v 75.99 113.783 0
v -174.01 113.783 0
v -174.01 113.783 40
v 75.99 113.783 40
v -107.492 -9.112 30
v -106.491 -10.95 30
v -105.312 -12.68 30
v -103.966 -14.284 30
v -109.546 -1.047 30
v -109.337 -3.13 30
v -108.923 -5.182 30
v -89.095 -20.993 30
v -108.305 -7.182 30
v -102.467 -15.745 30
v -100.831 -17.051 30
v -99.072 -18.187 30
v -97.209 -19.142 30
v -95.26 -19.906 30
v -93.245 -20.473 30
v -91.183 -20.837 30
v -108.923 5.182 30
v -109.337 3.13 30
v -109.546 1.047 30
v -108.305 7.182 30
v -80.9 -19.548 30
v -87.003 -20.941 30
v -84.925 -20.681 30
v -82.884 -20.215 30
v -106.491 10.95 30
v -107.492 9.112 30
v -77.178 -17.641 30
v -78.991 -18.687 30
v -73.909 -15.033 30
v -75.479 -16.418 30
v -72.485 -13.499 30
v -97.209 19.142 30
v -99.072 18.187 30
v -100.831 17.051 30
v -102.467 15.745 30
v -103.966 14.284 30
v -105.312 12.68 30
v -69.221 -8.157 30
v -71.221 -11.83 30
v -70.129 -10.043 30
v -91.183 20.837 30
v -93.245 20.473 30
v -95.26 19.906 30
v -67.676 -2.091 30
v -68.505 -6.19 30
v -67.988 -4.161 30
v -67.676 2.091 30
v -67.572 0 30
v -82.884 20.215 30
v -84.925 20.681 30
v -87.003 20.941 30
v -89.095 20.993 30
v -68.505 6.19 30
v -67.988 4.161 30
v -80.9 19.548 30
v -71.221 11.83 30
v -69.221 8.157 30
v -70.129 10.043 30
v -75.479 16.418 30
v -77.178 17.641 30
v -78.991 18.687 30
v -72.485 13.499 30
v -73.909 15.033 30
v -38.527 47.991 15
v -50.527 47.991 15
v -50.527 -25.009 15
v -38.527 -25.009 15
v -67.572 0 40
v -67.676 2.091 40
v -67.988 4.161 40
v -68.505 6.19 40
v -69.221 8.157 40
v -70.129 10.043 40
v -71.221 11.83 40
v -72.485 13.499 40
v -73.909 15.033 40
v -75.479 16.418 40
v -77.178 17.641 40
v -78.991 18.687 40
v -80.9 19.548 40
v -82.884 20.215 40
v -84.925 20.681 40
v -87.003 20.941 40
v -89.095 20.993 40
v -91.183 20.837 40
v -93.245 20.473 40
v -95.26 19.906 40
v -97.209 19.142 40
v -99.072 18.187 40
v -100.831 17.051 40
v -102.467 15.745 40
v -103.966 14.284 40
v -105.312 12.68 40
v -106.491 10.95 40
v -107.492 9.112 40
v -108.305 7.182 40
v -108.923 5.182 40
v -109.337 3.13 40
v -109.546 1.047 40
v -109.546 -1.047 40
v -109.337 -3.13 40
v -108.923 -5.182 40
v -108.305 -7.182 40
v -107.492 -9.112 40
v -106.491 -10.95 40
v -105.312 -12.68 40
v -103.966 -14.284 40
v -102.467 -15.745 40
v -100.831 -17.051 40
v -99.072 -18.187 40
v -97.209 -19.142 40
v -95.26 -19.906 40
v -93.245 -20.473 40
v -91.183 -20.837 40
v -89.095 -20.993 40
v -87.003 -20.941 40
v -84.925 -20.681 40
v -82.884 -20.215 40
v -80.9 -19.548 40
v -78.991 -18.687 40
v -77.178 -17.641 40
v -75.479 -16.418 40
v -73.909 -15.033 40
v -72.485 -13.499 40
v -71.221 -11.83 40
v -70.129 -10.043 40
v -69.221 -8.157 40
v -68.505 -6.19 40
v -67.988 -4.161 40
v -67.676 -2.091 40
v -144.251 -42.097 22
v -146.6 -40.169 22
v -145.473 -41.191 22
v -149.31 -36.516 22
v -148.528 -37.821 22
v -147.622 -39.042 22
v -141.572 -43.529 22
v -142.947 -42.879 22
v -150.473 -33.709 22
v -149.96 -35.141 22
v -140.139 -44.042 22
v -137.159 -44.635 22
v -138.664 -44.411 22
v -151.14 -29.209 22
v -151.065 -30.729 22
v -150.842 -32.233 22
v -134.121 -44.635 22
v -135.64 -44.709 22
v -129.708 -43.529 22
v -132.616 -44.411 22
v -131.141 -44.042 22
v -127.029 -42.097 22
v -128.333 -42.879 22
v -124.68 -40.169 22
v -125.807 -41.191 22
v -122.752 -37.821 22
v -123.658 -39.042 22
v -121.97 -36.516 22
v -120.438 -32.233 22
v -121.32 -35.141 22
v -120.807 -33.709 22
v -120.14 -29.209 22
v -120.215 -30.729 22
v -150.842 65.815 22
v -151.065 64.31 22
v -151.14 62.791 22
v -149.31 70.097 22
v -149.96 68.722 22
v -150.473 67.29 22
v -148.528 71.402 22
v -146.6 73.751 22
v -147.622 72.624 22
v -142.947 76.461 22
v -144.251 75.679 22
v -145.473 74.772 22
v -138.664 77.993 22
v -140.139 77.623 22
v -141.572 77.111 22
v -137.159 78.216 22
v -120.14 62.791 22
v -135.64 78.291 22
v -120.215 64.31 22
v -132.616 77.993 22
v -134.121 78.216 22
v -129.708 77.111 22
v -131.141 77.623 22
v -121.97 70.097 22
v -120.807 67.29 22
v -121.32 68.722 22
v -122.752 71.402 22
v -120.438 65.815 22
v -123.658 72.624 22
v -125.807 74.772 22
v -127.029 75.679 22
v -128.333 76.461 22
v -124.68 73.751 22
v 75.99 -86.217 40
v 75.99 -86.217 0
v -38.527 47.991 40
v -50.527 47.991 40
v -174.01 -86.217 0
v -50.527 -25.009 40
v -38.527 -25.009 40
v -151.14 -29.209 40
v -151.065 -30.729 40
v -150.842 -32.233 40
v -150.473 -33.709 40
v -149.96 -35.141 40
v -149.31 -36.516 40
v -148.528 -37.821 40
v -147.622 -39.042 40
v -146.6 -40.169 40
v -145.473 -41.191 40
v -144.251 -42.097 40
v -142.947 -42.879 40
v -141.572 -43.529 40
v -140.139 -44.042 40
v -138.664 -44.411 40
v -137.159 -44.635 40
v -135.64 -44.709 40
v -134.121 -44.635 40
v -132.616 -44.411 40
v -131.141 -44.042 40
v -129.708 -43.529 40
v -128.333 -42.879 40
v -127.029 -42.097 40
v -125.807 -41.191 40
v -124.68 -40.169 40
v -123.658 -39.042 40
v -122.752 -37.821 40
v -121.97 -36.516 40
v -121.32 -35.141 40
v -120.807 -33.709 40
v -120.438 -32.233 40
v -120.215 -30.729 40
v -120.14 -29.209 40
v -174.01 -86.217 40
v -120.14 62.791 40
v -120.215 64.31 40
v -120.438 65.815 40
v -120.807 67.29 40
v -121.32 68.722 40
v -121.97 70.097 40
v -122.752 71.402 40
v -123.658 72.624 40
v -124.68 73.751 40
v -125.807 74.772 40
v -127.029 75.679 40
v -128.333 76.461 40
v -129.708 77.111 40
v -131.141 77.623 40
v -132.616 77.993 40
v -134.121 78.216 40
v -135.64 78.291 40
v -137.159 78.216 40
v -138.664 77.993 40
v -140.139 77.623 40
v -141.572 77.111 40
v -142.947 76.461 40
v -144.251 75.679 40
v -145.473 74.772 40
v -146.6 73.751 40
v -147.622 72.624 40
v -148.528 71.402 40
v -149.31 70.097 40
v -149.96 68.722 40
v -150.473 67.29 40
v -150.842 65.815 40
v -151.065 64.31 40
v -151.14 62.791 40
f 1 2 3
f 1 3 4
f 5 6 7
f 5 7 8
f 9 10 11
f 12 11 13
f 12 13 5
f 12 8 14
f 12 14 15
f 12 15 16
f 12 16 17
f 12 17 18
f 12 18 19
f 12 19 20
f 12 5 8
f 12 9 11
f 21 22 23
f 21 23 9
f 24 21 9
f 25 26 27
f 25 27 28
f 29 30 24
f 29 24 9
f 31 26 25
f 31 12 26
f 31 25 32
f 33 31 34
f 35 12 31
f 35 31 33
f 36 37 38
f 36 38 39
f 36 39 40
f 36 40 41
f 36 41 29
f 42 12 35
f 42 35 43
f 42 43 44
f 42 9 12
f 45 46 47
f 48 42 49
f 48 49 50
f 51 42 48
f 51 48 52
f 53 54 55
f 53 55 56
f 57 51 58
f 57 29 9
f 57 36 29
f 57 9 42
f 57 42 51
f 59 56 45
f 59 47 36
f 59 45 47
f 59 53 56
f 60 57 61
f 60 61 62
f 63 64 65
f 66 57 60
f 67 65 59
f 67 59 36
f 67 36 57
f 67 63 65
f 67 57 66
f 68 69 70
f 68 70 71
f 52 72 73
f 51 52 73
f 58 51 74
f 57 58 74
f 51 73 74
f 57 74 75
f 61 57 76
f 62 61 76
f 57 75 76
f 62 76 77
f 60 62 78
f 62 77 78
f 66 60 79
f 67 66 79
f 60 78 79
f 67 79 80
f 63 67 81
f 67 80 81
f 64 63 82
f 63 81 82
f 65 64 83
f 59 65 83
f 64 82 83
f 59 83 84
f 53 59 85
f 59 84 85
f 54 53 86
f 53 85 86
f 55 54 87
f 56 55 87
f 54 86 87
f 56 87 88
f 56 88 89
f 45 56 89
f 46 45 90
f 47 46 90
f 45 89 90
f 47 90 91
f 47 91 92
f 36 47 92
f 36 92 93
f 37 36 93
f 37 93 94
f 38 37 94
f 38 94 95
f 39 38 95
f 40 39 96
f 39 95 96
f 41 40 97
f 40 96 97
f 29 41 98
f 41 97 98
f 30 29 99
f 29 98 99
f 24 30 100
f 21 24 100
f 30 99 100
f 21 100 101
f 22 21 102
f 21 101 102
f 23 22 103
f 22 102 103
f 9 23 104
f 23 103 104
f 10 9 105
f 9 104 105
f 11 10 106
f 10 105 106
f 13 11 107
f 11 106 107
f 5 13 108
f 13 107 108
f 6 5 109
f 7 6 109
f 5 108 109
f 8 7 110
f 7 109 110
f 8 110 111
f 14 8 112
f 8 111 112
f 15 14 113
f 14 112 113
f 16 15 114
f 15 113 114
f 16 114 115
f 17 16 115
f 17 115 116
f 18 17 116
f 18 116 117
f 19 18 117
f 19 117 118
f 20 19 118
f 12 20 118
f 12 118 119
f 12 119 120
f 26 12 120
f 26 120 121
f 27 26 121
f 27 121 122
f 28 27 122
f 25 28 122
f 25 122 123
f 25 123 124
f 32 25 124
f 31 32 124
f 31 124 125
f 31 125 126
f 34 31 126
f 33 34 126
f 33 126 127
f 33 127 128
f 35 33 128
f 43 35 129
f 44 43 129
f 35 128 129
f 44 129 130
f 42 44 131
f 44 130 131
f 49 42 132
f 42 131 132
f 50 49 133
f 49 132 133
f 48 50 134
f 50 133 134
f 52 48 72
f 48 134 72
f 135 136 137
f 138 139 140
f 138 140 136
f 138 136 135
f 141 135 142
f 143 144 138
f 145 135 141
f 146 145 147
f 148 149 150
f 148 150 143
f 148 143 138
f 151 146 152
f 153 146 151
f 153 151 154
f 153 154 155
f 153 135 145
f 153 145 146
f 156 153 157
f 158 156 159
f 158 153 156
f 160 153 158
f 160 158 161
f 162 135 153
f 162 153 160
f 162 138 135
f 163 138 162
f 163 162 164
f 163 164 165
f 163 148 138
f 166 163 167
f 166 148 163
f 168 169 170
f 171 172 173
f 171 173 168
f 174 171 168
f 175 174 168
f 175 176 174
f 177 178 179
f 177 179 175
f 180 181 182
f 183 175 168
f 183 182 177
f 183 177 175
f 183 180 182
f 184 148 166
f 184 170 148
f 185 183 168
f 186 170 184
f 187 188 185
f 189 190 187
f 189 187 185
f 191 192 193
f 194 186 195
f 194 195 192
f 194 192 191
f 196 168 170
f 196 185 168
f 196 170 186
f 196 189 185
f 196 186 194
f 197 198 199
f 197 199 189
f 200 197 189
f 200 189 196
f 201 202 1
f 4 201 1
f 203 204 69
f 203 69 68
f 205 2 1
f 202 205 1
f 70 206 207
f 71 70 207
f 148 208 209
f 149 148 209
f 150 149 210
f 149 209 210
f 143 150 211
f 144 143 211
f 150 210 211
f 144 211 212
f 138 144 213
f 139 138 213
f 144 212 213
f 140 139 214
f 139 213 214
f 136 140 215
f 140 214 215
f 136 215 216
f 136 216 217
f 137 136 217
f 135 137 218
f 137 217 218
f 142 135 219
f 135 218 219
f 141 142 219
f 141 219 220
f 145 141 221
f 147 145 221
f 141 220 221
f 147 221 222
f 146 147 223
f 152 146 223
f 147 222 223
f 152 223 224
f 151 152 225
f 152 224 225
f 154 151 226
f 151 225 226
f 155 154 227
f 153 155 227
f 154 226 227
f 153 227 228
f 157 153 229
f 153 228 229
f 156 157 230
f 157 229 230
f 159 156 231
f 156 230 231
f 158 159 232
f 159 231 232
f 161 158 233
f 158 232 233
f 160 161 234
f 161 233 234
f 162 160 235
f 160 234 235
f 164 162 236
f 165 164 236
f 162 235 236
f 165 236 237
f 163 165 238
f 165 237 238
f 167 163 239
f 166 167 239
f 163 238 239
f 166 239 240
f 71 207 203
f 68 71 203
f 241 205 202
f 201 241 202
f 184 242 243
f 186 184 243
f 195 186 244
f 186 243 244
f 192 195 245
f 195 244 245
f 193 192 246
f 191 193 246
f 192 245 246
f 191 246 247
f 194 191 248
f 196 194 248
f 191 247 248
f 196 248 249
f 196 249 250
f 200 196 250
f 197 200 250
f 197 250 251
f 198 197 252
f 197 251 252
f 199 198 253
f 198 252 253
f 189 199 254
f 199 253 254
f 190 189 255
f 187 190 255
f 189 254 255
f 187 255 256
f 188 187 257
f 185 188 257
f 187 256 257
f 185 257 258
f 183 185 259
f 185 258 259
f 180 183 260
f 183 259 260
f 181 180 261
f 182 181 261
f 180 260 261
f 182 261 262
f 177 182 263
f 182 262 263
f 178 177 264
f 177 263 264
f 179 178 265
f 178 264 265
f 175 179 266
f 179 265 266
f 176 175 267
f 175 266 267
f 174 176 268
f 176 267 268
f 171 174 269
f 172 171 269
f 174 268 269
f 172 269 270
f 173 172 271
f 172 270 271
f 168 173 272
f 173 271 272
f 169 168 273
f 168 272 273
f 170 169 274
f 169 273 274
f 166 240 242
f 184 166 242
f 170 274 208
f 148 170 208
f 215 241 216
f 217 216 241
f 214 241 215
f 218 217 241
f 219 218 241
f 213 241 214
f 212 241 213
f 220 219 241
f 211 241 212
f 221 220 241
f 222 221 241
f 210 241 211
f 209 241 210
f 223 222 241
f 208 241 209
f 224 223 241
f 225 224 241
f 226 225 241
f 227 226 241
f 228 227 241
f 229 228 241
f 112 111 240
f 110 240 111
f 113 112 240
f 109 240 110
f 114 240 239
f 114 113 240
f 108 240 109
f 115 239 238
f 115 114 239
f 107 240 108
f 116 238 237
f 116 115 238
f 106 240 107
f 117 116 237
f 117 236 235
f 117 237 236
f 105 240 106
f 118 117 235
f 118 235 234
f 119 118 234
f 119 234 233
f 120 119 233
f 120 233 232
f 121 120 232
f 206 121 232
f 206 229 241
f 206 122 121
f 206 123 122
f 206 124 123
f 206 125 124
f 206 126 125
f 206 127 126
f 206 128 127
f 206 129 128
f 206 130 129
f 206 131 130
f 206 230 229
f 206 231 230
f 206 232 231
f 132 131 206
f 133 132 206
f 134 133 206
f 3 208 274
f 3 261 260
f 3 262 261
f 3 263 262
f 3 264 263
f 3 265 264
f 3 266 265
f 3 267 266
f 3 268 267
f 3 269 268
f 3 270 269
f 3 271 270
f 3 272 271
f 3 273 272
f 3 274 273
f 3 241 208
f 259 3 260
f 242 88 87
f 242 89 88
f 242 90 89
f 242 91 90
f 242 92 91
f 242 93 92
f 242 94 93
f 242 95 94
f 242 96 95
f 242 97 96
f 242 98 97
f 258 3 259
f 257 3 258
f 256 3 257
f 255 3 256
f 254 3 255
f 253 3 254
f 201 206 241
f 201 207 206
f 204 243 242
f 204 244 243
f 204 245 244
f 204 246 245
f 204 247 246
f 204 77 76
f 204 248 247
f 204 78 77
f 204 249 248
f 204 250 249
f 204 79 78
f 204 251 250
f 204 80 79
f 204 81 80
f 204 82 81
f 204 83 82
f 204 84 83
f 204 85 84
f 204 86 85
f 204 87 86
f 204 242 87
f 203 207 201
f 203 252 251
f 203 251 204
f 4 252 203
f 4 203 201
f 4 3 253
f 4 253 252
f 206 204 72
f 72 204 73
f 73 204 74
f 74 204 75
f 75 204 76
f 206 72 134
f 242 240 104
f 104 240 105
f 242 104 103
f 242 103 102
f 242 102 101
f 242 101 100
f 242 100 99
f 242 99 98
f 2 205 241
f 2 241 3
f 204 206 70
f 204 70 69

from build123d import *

# Parameters (mm, degrees)
F0_W      = 250
F0_H      = 200
F1_DEPTH  = 40
F3_DEPTH  = 18
F4_R      = 21
F5_DEPTH  = 10
F6_W      = 12
F6_H      = 73
F7_DEPTH  = 25
F8_W      = 155
F8_H      = 15
F9_DEPTH  = 25
F9_FACE_W = 155
F9_FACE_H = 25
F10_DEPTH = 47


with BuildPart() as f1:
    # F0 (on Top) → F1 (new body)
    with BuildSketch(Plane.XY):
        with Locations((-49.009792, 13.782904)):
            Rectangle(F0_W, F0_H)
    extrude(amount=F1_DEPTH)

    # F2 (on face) → F3 (cut)
    with BuildSketch(Plane.XY.offset(40)):
        with BuildLine():
            ThreePointArc((-151.139951, -29.209269), (-135.639951, -44.709269), (-120.139951, -29.209269))
            Line((-120.139951, -29.209269), (-120.139951, 62.790731))
            ThreePointArc((-120.139951, 62.790731), (-135.639951, 78.290731), (-151.139951, 62.790731))
            Line((-151.139951, 62.790731), (-151.139951, -29.209269))
        make_face()
    extrude(amount=-F3_DEPTH, mode=Mode.SUBTRACT)

    # F4 (on face) → F5 (cut)
    with BuildSketch(Plane.XY.offset(40)):
        with Locations((-88.571906, 0)):
            Circle(F4_R)
    extrude(amount=-F5_DEPTH, mode=Mode.SUBTRACT)

    # F6 (on face) → F7 (cut)
    with BuildSketch(Plane.XY.offset(40)):
        with Locations((-44.527275, 11.491382)):
            Rectangle(F6_W, F6_H)
    extrude(amount=-F7_DEPTH, mode=Mode.SUBTRACT)

    # F8 (on face) → F9 (join)
    with BuildSketch(Plane.XY.offset(40)):
        with Locations((-47.150943, 102.282946)):
            Rectangle(F8_W, F8_H)
    extrude(amount=F9_DEPTH)

    # F9_face (on face) → F10 (cut)
    with BuildSketch(Plane(origin=(-47.150943, 94.782946, 52.5), x_dir=(1, 0, 0), z_dir=(0, -1, 0))):
        Rectangle(F9_FACE_W, F9_FACE_H)
    extrude(amount=-F10_DEPTH, mode=Mode.SUBTRACT)


solid = f1.part
